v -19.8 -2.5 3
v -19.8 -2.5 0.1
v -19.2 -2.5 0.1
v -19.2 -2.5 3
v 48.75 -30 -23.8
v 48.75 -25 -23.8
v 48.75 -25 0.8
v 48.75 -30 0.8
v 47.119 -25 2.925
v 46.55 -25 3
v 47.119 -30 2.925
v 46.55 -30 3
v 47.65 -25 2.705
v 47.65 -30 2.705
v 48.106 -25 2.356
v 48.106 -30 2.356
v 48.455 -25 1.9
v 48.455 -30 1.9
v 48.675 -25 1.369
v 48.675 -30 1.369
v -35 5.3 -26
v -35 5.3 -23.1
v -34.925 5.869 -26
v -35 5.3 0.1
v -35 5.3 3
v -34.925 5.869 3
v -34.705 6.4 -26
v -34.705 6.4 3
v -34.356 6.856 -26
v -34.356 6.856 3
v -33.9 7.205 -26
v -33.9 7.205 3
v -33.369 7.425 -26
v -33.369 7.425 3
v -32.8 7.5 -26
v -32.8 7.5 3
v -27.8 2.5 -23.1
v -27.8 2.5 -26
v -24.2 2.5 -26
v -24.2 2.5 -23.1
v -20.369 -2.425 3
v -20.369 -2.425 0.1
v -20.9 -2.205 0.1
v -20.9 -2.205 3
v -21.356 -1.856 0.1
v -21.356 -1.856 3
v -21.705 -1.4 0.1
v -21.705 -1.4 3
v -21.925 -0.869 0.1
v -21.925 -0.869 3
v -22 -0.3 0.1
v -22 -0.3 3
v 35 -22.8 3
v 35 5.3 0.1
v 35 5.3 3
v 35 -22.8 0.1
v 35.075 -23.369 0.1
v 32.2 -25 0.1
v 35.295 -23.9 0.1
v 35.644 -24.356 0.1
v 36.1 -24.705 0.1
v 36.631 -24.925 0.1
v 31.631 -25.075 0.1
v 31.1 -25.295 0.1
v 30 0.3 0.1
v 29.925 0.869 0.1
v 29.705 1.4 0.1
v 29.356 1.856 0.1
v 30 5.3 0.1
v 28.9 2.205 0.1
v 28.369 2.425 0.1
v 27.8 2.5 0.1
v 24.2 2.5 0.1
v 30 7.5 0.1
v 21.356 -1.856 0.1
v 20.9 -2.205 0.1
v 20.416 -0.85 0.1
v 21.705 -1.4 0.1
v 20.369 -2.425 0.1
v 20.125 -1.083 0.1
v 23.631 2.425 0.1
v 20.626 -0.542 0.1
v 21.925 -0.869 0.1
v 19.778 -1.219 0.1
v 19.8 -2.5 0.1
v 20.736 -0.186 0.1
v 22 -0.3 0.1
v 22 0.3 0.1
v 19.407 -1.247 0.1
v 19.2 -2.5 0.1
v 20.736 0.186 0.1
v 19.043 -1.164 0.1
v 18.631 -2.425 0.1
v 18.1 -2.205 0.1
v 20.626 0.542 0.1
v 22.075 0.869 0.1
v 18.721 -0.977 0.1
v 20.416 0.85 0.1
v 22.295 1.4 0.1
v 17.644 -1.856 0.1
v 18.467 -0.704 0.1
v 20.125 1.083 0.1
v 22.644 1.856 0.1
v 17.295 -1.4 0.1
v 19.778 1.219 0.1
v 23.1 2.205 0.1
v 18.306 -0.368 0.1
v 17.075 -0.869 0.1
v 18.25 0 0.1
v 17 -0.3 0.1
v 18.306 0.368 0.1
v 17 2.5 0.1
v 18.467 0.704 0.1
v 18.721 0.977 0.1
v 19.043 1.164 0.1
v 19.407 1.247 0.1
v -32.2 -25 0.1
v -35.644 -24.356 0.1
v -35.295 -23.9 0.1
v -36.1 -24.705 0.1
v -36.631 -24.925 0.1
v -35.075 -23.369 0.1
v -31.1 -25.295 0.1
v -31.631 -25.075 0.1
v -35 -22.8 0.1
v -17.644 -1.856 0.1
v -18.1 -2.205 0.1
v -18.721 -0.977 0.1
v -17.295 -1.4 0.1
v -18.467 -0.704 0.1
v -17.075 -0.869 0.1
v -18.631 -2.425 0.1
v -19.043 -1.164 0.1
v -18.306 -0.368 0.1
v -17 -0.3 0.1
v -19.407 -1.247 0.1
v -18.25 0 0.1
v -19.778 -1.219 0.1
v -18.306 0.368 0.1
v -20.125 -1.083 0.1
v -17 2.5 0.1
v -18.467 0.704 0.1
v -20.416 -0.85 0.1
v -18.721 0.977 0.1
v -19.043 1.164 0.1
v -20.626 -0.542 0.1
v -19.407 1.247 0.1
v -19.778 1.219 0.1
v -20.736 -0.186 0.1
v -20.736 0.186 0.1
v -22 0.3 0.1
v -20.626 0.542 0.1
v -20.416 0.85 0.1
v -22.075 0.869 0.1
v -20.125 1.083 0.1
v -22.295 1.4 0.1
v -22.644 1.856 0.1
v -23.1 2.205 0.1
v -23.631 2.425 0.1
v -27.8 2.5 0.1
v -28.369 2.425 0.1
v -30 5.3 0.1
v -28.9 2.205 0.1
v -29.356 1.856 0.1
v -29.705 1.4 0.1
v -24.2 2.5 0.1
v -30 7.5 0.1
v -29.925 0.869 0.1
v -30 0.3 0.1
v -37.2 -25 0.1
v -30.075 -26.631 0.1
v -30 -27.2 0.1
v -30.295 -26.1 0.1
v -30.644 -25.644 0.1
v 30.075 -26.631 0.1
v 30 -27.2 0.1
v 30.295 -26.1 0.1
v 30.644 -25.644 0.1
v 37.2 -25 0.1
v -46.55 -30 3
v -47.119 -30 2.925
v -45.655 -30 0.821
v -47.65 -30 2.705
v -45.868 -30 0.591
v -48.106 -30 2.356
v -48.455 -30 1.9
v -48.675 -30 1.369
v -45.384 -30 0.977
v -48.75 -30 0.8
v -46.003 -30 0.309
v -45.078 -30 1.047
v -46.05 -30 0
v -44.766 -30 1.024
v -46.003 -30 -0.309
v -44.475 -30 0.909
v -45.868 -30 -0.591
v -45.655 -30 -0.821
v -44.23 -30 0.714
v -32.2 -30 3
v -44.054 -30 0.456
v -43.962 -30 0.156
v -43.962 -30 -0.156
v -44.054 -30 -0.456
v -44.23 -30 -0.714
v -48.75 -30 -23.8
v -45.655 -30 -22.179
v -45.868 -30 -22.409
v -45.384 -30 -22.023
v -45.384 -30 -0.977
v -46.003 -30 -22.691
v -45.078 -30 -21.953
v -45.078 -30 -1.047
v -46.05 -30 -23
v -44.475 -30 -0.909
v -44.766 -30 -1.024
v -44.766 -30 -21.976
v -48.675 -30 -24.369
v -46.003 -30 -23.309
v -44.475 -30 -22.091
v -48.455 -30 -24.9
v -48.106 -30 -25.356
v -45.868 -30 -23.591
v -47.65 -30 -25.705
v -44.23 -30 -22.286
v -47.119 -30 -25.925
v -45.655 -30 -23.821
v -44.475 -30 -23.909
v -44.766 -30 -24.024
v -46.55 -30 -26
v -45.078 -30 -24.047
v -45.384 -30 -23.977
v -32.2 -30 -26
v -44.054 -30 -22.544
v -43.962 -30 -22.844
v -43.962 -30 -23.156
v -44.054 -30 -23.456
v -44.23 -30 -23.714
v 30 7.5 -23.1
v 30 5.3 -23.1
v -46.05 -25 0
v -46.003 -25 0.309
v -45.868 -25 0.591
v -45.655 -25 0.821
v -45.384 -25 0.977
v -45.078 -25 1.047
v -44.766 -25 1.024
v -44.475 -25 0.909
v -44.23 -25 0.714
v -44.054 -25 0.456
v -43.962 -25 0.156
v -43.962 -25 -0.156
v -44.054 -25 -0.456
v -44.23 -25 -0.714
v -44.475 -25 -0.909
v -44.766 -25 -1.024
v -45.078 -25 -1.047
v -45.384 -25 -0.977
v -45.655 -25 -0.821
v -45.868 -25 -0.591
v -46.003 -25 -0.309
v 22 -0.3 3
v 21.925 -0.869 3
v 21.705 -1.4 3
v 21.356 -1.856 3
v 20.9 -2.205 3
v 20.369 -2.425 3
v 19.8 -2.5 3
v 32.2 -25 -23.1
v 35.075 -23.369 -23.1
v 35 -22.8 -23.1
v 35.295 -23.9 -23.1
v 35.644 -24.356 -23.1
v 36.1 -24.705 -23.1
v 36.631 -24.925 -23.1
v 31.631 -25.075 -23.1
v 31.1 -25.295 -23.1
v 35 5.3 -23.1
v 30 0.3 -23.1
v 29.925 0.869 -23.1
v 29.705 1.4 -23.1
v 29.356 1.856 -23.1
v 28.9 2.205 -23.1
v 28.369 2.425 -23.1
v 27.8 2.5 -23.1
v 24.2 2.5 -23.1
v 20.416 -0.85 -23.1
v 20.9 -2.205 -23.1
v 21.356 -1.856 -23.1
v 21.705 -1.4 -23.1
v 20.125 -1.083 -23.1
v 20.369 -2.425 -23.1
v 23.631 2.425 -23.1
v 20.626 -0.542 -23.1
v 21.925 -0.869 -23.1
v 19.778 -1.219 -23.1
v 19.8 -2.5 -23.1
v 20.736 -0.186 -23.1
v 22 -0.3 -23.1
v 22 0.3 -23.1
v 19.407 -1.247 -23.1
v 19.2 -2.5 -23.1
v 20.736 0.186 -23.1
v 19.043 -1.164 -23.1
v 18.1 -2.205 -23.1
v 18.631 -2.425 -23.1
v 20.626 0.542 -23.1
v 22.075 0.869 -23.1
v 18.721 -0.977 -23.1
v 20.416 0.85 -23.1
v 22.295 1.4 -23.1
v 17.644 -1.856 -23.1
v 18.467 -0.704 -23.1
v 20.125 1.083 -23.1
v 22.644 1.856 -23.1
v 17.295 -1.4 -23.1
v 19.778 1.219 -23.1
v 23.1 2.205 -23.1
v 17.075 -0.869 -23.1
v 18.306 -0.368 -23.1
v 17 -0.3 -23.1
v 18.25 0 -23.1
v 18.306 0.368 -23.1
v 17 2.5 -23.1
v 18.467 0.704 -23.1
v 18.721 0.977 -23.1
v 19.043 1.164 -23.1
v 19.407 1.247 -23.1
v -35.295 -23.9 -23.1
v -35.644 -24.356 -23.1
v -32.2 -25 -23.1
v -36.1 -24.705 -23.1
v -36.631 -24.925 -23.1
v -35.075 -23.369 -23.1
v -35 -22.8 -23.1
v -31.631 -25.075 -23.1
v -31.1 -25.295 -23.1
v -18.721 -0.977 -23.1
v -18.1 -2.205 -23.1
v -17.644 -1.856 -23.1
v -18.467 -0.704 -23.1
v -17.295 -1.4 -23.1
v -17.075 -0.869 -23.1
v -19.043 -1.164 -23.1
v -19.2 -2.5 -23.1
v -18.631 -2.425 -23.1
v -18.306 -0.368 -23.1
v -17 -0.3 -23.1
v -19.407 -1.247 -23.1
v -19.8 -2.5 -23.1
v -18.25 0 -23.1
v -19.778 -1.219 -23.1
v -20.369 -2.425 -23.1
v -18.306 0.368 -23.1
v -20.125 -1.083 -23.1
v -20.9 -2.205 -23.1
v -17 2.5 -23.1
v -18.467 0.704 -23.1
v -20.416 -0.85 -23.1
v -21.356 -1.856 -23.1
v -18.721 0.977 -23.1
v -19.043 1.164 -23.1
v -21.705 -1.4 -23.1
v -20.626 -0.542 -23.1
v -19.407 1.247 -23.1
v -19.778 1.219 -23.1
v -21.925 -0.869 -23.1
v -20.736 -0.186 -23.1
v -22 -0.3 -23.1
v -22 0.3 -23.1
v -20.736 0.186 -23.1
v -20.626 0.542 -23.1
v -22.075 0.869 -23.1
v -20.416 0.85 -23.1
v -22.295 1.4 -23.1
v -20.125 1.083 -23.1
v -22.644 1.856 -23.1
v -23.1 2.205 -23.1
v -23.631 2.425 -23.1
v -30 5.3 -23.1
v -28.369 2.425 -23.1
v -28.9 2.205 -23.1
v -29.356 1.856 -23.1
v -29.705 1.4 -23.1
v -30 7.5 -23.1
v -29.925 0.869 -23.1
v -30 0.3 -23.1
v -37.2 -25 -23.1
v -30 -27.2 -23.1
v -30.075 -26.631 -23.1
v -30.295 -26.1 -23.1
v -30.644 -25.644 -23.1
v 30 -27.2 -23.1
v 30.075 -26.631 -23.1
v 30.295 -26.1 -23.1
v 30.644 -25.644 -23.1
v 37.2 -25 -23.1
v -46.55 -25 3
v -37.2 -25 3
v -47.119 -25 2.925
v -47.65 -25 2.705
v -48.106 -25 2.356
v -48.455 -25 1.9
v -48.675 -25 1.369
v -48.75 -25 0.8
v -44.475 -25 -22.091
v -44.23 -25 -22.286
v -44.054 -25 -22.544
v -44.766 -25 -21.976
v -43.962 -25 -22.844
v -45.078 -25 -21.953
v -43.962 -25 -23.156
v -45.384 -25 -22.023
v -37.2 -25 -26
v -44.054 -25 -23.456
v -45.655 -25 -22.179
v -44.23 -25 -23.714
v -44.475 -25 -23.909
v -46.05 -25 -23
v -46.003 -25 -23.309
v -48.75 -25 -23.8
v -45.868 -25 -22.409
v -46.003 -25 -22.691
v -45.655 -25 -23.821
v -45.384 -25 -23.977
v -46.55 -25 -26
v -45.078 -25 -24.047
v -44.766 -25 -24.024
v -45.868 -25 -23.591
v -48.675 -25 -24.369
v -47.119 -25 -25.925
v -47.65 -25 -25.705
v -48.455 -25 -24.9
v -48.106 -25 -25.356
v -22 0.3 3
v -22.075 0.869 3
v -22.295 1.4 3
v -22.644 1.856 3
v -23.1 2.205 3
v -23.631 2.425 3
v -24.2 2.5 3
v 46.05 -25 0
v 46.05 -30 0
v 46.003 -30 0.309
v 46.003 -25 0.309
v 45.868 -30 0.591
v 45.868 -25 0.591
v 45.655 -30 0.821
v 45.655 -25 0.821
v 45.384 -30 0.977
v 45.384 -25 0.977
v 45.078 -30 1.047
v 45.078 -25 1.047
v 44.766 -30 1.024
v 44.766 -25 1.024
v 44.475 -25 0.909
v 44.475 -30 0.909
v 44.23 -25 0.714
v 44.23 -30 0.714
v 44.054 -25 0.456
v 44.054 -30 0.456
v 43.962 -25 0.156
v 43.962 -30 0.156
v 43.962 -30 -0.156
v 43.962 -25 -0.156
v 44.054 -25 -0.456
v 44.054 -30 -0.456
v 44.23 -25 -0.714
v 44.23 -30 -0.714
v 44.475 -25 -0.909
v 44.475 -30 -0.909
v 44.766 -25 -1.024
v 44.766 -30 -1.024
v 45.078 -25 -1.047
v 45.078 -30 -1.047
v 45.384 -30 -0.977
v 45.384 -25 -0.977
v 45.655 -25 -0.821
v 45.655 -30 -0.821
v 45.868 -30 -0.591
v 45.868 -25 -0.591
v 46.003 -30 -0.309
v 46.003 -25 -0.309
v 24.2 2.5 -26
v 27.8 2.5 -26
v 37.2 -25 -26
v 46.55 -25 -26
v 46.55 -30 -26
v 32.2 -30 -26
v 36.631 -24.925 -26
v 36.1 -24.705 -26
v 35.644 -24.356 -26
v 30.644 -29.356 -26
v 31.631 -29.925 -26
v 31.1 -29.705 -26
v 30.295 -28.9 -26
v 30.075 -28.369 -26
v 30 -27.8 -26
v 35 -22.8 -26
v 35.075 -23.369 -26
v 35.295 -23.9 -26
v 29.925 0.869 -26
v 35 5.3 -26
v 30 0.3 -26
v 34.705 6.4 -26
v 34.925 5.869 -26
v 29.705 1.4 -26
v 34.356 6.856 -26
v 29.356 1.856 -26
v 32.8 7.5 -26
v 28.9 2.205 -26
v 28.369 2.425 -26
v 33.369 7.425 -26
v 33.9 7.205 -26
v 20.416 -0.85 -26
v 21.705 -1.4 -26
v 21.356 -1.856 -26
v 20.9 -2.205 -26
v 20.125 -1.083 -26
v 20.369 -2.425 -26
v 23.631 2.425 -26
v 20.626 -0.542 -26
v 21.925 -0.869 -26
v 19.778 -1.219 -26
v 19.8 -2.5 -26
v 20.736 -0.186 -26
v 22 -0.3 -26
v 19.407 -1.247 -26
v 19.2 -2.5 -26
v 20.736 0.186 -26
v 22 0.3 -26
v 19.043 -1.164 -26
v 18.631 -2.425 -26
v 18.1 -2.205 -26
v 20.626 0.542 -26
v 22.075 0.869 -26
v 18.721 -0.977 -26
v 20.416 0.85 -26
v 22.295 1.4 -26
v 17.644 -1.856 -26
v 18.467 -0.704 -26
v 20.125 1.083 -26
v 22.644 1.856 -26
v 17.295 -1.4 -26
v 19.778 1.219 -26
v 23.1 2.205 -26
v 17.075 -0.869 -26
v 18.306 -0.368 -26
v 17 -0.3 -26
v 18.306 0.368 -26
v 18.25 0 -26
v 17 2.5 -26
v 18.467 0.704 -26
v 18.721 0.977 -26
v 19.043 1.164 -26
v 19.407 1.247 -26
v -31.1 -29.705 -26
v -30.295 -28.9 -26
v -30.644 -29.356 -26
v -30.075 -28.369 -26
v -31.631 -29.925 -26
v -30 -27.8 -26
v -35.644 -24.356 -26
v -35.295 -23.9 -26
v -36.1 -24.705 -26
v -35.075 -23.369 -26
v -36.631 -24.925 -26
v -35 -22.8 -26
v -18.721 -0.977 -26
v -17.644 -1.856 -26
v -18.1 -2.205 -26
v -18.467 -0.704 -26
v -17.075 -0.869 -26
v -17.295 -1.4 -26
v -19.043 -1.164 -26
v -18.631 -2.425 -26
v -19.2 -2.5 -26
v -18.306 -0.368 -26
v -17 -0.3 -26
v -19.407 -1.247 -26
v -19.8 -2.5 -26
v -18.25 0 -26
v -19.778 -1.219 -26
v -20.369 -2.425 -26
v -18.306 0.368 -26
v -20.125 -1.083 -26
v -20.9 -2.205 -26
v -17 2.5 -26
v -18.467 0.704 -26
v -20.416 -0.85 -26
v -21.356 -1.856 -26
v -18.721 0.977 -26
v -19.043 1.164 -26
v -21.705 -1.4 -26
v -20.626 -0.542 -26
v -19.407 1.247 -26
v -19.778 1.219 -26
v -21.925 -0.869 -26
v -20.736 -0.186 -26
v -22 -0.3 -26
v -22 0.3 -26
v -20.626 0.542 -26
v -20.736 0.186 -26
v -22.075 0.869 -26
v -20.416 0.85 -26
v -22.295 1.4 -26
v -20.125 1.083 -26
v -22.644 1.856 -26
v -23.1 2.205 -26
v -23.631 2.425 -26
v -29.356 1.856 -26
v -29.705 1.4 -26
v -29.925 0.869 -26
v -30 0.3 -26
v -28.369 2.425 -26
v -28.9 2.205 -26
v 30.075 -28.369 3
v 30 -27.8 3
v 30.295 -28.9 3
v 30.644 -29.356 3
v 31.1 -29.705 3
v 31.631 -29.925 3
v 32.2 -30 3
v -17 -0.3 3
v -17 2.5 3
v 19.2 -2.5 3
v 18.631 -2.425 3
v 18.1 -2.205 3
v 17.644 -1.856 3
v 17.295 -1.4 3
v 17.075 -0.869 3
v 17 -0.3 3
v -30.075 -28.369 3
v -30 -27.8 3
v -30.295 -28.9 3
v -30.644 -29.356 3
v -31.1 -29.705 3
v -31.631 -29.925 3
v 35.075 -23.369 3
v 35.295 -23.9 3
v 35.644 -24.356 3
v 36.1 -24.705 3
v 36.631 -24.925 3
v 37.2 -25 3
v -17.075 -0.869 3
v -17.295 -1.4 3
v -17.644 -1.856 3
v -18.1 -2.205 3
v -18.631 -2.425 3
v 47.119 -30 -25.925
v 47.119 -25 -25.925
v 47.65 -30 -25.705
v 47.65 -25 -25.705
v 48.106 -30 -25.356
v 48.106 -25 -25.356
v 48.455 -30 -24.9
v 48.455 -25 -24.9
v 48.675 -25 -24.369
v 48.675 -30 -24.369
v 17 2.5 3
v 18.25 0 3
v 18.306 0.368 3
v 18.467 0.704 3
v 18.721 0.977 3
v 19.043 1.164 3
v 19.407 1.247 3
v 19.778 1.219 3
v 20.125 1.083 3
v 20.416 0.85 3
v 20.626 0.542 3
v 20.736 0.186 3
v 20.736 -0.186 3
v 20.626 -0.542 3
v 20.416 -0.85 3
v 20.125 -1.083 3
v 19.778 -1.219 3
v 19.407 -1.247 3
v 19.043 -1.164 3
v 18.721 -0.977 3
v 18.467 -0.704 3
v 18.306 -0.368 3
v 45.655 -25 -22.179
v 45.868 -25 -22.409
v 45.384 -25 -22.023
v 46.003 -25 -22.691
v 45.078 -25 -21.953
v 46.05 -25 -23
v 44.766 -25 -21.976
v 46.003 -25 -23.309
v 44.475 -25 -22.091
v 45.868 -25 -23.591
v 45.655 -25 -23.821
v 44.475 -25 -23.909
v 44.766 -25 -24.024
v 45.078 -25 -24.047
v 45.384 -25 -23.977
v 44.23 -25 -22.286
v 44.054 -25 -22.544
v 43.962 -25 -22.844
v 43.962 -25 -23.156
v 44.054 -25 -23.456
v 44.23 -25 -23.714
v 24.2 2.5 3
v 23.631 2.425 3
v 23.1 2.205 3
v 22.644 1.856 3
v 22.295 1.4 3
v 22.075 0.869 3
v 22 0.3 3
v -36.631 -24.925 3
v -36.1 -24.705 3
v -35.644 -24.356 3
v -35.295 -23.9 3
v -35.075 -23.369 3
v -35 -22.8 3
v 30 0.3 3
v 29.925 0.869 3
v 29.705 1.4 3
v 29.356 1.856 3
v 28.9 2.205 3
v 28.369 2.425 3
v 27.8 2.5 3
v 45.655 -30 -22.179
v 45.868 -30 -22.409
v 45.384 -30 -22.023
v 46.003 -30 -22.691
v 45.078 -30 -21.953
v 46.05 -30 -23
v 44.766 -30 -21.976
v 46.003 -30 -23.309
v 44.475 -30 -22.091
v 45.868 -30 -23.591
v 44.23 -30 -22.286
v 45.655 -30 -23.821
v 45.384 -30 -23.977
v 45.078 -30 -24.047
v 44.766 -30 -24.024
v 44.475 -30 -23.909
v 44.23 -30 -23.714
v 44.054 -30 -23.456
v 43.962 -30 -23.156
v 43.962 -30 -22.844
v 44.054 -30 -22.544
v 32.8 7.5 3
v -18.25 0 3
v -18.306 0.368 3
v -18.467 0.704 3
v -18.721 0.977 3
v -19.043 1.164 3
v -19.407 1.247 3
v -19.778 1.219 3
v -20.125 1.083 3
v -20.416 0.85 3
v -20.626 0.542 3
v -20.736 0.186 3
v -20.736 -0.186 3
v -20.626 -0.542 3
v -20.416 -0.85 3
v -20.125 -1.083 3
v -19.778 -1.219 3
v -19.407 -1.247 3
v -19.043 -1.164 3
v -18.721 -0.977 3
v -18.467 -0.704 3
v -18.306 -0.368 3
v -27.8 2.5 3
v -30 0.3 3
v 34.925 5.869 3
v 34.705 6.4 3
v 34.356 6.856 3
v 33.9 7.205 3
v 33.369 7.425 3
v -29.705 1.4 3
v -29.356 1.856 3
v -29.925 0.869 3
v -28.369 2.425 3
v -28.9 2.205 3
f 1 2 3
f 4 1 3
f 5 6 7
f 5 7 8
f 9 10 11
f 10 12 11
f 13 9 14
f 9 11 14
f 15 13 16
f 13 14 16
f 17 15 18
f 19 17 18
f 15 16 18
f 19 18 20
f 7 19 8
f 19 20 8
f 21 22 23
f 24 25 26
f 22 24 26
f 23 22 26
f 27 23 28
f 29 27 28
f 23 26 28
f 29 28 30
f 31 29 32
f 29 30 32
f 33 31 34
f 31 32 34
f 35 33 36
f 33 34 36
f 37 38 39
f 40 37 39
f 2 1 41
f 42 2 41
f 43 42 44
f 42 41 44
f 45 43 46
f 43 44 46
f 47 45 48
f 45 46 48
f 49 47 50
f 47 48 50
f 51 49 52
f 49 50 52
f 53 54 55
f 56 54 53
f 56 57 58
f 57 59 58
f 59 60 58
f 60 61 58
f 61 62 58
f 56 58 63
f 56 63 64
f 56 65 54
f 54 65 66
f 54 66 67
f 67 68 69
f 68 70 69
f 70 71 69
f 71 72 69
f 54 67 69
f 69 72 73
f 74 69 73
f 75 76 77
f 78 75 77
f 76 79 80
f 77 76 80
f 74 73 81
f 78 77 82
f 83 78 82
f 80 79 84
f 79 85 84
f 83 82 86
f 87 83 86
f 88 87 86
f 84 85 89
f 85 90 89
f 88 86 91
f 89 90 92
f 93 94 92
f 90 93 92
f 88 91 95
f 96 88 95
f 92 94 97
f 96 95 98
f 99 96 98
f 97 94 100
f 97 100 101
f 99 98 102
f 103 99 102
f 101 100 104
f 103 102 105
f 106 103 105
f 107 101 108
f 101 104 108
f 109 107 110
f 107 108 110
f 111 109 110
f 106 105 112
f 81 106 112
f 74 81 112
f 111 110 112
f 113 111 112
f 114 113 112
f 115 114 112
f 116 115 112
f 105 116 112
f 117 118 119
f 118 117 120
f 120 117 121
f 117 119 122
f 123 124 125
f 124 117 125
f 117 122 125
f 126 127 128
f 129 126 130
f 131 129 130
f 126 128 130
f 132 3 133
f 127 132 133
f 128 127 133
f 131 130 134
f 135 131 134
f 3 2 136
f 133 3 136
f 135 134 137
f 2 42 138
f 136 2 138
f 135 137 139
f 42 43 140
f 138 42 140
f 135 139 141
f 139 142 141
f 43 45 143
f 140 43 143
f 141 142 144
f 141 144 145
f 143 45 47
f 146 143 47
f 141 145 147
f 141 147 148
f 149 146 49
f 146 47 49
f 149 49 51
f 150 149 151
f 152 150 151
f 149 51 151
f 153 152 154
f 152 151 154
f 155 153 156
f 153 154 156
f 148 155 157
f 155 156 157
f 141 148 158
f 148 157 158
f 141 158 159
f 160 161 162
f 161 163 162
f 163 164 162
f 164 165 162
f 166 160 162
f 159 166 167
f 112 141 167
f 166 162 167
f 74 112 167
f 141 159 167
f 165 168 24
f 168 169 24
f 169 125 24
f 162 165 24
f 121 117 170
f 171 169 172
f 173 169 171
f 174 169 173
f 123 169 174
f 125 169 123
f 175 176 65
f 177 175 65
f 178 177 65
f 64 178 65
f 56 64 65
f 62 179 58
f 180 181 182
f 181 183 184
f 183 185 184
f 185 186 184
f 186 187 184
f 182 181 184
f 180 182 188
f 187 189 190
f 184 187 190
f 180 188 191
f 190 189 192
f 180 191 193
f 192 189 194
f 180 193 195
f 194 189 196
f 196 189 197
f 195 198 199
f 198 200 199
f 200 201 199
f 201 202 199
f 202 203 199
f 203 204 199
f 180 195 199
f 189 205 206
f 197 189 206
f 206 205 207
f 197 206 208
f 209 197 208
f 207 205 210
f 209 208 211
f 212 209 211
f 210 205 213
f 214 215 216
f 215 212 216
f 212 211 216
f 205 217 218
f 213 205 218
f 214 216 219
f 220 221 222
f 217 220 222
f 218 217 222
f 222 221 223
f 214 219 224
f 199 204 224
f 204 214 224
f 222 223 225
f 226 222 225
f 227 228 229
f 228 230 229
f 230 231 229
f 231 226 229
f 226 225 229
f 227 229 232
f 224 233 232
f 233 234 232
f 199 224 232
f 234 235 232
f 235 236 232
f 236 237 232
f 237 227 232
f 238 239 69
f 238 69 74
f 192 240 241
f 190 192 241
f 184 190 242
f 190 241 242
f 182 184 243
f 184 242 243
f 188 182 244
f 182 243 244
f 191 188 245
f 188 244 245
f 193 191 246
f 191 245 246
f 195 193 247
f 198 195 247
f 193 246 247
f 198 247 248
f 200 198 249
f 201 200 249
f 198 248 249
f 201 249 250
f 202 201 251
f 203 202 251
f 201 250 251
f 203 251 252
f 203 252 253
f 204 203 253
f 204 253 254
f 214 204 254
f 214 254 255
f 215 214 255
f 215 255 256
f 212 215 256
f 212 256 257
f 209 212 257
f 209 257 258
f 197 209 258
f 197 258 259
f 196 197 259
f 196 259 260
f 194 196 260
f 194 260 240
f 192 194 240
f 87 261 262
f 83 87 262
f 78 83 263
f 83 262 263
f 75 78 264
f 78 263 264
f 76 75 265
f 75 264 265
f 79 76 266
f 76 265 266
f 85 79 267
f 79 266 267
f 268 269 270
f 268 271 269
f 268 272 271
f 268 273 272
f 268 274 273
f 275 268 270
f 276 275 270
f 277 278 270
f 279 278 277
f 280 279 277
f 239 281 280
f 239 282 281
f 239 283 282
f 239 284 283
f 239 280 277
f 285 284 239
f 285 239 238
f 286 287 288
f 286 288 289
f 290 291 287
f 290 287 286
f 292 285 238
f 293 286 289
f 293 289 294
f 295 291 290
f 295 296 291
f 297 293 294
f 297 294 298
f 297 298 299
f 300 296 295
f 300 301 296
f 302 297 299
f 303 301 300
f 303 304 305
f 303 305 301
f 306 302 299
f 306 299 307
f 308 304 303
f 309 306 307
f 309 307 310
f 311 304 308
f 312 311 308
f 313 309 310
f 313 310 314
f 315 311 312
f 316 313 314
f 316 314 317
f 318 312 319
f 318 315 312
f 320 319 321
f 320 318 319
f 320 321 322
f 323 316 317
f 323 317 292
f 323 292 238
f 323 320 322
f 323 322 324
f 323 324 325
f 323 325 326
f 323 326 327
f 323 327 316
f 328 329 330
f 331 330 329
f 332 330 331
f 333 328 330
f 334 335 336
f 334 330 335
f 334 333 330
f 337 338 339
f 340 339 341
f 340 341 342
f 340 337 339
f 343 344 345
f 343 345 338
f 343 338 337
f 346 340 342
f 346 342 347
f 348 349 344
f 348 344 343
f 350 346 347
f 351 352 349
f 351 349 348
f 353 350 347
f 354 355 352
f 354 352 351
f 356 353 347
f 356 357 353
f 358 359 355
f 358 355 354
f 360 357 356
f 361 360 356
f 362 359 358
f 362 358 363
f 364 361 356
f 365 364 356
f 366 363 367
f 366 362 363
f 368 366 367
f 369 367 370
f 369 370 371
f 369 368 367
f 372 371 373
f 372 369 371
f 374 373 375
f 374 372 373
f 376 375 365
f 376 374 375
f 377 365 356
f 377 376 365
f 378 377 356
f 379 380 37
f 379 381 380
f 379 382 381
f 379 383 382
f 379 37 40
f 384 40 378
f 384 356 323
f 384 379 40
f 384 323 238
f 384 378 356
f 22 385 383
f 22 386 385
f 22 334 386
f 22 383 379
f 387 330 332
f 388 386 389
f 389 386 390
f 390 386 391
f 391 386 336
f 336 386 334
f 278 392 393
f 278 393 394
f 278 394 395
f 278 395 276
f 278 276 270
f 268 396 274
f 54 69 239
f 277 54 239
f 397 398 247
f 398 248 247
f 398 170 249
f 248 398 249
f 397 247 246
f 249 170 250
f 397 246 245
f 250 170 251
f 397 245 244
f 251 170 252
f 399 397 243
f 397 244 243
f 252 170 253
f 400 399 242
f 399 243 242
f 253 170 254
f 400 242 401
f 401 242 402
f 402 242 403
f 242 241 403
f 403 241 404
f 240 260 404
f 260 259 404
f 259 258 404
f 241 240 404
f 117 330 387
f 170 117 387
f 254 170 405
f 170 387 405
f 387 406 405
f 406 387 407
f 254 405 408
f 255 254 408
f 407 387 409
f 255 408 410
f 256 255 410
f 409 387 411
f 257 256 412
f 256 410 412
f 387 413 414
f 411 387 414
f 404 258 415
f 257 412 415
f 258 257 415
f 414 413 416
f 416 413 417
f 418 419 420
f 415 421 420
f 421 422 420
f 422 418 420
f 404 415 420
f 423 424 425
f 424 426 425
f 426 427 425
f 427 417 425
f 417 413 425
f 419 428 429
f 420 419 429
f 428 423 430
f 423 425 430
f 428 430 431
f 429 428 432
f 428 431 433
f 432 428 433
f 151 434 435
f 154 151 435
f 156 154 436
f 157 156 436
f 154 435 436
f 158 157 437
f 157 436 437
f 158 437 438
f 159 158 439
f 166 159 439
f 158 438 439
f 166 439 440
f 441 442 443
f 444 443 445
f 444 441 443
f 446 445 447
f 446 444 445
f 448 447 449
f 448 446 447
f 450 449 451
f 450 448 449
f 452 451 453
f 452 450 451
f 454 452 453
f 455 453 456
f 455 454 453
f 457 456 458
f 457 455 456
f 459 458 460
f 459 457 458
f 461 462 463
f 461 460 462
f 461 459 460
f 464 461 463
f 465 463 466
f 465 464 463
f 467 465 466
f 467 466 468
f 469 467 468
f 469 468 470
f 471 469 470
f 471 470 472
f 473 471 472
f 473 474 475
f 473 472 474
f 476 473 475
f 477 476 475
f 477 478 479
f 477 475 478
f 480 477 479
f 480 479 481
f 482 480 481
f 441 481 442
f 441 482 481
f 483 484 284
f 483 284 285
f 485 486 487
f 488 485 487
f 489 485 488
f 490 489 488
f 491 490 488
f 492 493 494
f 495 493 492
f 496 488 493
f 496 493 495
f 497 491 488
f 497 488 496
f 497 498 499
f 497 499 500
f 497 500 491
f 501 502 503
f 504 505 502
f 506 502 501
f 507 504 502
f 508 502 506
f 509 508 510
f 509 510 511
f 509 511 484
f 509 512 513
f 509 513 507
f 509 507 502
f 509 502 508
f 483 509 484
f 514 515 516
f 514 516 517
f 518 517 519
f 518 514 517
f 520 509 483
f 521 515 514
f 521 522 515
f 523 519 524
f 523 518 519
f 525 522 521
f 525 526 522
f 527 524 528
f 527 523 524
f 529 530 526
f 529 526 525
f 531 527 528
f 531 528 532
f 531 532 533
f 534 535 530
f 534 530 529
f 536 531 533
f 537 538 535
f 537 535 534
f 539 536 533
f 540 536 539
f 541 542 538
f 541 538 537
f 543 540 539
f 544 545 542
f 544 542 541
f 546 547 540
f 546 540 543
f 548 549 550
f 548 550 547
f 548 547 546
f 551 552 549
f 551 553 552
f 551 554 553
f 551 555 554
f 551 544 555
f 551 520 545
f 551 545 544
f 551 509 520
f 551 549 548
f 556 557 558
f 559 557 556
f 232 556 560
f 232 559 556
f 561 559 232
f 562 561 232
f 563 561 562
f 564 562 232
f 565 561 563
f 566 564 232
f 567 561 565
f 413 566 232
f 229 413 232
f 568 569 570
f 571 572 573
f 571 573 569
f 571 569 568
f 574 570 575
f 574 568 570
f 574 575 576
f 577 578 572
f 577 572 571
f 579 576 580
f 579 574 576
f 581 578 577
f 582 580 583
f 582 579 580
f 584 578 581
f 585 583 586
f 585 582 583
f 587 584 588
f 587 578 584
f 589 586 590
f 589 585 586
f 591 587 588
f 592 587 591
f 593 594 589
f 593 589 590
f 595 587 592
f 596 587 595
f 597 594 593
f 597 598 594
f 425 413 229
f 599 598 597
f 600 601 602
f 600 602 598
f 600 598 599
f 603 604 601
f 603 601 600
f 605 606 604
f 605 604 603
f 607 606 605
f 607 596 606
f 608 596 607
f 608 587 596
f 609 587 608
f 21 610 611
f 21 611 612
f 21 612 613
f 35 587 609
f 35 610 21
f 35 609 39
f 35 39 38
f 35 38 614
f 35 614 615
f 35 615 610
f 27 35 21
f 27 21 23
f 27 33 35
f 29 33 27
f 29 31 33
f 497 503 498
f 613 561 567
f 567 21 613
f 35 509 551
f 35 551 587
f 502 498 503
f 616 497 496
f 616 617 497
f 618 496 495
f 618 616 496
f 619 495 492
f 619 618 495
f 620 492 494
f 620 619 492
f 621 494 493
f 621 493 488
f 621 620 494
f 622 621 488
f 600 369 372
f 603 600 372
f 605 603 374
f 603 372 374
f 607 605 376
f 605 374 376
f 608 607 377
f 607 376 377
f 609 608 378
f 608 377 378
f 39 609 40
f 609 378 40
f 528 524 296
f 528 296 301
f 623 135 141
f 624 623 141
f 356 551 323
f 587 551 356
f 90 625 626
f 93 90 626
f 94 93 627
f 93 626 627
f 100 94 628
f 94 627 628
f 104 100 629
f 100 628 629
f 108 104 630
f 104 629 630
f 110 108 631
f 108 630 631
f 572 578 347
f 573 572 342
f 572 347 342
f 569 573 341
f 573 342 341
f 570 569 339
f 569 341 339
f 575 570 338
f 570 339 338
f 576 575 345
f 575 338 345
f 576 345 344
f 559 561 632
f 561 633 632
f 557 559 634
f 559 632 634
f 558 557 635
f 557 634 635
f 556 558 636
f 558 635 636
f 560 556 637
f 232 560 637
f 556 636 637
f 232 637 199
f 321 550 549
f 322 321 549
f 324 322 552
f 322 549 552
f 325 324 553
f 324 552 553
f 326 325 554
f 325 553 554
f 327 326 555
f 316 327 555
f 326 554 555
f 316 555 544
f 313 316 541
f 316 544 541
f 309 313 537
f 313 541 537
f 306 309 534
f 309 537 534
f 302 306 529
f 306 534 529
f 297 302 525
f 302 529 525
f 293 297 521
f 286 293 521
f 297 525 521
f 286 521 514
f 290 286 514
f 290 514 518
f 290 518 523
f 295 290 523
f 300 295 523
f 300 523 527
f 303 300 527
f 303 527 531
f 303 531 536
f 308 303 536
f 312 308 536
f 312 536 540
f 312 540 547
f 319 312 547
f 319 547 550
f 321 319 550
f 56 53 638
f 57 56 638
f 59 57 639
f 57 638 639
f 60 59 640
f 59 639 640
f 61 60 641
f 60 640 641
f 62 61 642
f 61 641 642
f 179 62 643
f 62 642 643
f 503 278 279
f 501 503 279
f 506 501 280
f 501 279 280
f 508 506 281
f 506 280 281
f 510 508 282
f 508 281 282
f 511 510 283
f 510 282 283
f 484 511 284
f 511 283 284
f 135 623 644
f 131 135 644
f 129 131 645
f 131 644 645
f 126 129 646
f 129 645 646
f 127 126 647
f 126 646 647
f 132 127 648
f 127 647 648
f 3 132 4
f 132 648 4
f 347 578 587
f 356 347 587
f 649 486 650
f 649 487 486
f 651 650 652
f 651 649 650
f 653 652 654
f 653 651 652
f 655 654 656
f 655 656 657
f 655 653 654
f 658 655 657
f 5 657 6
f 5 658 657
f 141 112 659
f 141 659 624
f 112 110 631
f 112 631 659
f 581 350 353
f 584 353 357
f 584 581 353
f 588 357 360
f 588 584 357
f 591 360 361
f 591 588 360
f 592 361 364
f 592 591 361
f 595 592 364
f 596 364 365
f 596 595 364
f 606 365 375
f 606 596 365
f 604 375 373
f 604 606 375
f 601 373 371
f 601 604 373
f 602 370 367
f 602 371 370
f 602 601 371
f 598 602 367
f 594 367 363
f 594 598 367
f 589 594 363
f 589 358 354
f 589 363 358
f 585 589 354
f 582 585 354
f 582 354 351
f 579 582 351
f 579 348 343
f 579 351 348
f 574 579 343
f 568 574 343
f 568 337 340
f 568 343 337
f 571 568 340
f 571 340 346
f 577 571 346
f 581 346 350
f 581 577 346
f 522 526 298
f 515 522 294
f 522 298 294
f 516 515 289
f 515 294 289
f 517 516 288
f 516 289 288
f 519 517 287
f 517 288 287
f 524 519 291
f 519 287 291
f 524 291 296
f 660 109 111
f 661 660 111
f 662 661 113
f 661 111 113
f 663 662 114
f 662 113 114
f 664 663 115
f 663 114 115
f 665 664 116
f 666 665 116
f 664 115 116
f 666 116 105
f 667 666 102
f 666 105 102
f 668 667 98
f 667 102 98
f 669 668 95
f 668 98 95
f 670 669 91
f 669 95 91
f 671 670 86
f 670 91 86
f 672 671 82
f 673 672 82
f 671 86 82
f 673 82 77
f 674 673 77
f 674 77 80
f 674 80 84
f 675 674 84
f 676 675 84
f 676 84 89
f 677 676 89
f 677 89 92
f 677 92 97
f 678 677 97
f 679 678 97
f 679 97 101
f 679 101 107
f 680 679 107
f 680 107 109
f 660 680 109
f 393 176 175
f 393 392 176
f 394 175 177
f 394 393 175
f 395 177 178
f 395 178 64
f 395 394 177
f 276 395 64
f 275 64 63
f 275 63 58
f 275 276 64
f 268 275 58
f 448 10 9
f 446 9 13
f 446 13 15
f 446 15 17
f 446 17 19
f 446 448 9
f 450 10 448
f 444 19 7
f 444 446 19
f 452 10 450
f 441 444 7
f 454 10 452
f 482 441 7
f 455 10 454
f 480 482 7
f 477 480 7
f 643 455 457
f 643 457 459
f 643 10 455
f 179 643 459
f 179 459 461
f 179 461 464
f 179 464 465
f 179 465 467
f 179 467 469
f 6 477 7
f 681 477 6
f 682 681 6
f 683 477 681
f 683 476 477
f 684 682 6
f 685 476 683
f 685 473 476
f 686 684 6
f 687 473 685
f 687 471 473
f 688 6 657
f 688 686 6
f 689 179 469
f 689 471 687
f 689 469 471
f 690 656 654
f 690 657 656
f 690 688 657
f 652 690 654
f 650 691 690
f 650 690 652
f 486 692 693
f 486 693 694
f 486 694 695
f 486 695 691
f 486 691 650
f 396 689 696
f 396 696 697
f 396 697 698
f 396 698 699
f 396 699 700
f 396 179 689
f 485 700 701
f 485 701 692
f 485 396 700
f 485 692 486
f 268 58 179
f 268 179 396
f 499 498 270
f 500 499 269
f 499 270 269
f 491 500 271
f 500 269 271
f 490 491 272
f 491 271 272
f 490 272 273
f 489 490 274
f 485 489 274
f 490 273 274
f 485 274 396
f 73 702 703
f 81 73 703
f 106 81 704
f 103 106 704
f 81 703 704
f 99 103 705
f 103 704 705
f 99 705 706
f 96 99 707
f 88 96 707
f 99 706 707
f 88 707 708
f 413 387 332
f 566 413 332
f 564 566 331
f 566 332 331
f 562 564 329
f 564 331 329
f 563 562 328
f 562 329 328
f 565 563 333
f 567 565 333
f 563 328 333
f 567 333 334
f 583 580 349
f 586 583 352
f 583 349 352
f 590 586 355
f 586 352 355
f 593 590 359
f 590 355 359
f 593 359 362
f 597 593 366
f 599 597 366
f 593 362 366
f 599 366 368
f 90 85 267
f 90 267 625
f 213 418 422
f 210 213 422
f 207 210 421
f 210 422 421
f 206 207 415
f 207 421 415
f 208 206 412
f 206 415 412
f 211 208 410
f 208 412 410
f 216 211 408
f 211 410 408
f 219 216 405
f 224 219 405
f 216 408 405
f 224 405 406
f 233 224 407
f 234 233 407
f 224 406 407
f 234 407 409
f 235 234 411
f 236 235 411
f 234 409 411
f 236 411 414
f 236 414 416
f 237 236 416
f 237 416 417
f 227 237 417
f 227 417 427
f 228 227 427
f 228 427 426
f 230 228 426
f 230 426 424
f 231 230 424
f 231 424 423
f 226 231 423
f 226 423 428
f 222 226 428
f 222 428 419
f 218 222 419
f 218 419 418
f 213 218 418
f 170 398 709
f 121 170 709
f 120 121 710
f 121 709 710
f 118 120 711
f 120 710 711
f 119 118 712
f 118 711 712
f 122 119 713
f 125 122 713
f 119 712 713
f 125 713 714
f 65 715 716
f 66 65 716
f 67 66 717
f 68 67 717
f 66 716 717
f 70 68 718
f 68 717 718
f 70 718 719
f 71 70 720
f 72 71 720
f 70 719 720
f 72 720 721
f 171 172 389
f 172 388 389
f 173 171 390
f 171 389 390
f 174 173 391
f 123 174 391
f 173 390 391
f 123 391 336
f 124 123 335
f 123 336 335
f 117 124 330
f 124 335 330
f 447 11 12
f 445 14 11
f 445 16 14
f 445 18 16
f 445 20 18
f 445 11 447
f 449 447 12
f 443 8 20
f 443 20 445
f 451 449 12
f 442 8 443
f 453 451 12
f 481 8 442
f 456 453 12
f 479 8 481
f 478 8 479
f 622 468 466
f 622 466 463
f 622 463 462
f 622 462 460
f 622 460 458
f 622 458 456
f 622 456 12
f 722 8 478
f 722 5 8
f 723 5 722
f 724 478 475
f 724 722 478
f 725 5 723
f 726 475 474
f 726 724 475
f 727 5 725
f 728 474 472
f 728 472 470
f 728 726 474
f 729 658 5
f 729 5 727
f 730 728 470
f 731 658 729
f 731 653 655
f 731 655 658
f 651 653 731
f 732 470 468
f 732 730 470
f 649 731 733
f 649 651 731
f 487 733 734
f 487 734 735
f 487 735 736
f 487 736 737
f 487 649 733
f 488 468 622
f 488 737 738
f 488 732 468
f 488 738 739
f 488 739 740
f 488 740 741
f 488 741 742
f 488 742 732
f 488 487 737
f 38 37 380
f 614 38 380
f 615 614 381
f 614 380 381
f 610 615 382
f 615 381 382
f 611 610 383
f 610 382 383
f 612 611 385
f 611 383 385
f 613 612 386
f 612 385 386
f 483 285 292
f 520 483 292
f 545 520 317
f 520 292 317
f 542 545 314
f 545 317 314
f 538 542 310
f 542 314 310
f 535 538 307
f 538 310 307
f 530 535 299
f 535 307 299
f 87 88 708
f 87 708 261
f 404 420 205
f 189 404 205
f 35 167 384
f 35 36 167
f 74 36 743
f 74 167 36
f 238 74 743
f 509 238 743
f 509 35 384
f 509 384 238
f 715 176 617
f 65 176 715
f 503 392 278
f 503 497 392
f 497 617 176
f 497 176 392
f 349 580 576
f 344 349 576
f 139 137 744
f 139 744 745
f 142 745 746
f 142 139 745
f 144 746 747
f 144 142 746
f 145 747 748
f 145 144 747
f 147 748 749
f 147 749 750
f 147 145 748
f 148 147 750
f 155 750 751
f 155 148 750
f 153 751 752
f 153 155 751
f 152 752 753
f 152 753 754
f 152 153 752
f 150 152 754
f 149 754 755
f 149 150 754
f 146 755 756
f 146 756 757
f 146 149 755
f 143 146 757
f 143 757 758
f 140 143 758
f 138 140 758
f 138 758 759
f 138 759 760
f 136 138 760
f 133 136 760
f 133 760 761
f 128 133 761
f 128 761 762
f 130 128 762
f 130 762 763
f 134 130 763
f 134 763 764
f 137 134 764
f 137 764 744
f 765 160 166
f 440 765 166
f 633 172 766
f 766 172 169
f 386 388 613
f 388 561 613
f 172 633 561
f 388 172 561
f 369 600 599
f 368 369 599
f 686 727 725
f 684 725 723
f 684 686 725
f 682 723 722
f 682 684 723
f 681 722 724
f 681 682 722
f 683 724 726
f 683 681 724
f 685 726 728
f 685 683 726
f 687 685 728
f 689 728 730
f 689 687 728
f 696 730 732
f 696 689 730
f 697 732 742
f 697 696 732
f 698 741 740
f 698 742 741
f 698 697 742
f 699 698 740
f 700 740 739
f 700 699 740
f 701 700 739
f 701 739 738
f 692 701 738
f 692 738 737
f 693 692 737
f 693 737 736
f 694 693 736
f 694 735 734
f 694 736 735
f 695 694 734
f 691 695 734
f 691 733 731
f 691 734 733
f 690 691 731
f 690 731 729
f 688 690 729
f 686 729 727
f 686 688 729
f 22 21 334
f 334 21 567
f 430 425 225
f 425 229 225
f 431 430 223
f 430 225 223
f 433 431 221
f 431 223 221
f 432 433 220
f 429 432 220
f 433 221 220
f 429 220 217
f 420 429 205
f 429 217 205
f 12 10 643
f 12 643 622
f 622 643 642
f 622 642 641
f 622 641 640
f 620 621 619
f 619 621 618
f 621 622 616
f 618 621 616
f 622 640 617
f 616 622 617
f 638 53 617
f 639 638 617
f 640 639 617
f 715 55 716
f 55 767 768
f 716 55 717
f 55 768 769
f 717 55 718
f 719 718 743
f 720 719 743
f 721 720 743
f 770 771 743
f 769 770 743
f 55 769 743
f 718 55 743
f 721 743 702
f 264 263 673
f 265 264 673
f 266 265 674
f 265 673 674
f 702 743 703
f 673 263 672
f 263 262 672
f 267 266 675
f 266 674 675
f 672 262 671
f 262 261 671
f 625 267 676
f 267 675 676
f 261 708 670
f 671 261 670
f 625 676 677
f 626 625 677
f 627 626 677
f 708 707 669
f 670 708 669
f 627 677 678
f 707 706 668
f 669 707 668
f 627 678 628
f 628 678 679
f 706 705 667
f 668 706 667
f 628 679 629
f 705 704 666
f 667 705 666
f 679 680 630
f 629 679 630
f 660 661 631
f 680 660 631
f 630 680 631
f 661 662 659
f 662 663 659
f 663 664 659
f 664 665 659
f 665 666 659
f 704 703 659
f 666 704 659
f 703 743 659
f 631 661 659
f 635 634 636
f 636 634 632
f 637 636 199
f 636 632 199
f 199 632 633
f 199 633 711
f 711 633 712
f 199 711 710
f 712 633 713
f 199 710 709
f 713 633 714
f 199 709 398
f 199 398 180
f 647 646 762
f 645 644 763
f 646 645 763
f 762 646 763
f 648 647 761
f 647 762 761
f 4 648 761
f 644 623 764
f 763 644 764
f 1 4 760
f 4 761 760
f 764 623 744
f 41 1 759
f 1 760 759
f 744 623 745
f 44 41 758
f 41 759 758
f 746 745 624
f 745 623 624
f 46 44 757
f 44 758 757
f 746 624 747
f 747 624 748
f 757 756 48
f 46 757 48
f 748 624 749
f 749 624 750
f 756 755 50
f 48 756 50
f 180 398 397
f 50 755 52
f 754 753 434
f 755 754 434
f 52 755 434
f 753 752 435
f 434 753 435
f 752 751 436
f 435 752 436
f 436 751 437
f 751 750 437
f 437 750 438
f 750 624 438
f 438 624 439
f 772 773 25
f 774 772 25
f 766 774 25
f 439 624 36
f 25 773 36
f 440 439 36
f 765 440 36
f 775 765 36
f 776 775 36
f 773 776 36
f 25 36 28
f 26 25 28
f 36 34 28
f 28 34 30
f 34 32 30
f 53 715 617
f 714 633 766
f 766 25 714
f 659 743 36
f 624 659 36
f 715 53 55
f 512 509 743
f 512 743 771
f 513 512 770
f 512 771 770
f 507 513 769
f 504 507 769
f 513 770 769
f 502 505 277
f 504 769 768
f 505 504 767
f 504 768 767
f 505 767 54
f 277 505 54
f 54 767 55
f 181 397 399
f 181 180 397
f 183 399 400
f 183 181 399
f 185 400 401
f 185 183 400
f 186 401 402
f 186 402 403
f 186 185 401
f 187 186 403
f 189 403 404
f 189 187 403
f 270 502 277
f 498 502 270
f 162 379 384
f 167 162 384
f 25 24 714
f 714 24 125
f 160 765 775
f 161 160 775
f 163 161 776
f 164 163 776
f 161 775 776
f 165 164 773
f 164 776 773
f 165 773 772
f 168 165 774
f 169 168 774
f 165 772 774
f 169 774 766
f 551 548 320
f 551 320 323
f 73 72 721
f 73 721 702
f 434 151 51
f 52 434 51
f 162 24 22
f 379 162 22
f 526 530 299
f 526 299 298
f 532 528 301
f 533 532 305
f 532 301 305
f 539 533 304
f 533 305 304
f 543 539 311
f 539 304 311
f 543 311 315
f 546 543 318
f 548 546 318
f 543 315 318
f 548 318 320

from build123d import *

# Parameters (mm, degrees)
BOSS_EXTRUDE1_START     = -26
SKETCH1_R               = 1.25
BOSS_EXTRUDE1_DEPTH     = 29
SKETCH2_R               = 1.05
CUT_EXTRUDE1_DEPTH      = 65.100019501
FILLET1_R               = 2.2
CUT_EXTRUDE2_DEPTH      = 63.8694083
CUT_EXTRUDE2_DEPTH_BACK = 63.8694083
SKETCH3_W               = 60
SKETCH3_H               = 23.2
CUT_EXTRUDE3_DEPTH      = 63.8694083
CUT_EXTRUDE3_DEPTH_BACK = 63.8694083
SKETCH4_W               = 23.2
SKETCH4_H               = 30.3
FILLET2_R               = 2.2


with BuildPart() as part:
    # Sketch1 → Boss-Extrude1 (new body)
    with BuildSketch(Plane.XY.offset(BOSS_EXTRUDE1_START)):
        Polygon((-30, -30), (-30, 2.5), (-22, 2.5), (-22, -2.5), (-17, -2.5), (-17, 2.5), (0, 2.5), (0, 7.5), (-35, 7.5), (-35, -25), (-48.75, -25), (-48.75, -30), align=None)
        with Locations((-19.5, 0)):
            Circle(SKETCH1_R, mode=Mode.SUBTRACT)
    boss_extrude1 = extrude(amount=BOSS_EXTRUDE1_DEPTH)

    # Sketch2 → Cut-Extrude1 (cut, through all)
    with BuildSketch(Plane(origin=(0, -25, 0), x_dir=(1, 0, 0), z_dir=(0, 1, 0))):
        with Locations(Location((-45, 23, 0), (0, 0, 180))):
            Circle(SKETCH2_R)
        with Locations(Location((-45, 0, 0), (0, 0, 180))):
            Circle(SKETCH2_R)
    cut_extrude1 = extrude(amount=-CUT_EXTRUDE1_DEPTH, mode=Mode.SUBTRACT)

    # Mirror1: Boss-Extrude1, Cut-Extrude1 across plane
    add(boss_extrude1.mirror(Plane(origin=(0, 0, 0), x_dir=(0, 0, 1), z_dir=(1, 0, 0))))
    add(cut_extrude1.mirror(Plane(origin=(0, 0, 0), x_dir=(0, 0, 1), z_dir=(1, 0, 0))), mode=Mode.SUBTRACT)

    # Fillet1
    fillet1_edges = [part.edges().sort_by_distance(p)[0] for p in [
        (-17, -2.5, -11.5),
        (-22, -2.5, -11.5),
        (-22, 2.5, -11.5),
        (-30, 2.5, -11.5),
        (-30, -30, -11.5),
        (-35, -25, -11.5),
        (-35, 7.5, -11.5),
        (-48.75, -27.5, 3),
        (-48.75, -27.5, -26),
        (17, -2.5, -11.5),
        (22, -2.5, -11.5),
        (22, 2.5, -11.5),
        (30, 2.5, -11.5),
        (30, -30, -11.5),
        (48.75, -27.5, -26),
        (48.75, -27.5, 3),
        (35, -25, -11.5),
        (35, 7.5, -11.5),
    ]]
    fillet(fillet1_edges, radius=FILLET1_R)

    # Sketch3 → Cut-Extrude2 (cut, two sides: drawn at the far end of the back side and taken through both)
    with BuildSketch(Plane(origin=(0, 0, 0), x_dir=(1, 0, 0), z_dir=(0, 1, 0)).offset(-CUT_EXTRUDE2_DEPTH_BACK)):
        with Locations((0, 11.5)):
            Rectangle(SKETCH3_W, SKETCH3_H)
    extrude(amount=CUT_EXTRUDE2_DEPTH + CUT_EXTRUDE2_DEPTH_BACK, mode=Mode.SUBTRACT)

    # Sketch4 → Cut-Extrude3 (cut, two sides: drawn at the far end of the back side and taken through both)
    with BuildSketch(Plane(origin=(0, 0, 0), x_dir=(0, 0, -1), z_dir=(1, 0, 0)).offset(-CUT_EXTRUDE3_DEPTH_BACK)):
        with Locations((11.5, -9.85)):
            Rectangle(SKETCH4_W, SKETCH4_H)
    extrude(amount=CUT_EXTRUDE3_DEPTH + CUT_EXTRUDE3_DEPTH_BACK, mode=Mode.SUBTRACT)

    # Fillet2
    fillet2_edges = [part.edges().sort_by_distance(p)[0] for p in [
        (-30, -25, -11.5),
        (30, -25, -11.5),
    ]]
    fillet(fillet2_edges, radius=FILLET2_R)


solid = part.part
